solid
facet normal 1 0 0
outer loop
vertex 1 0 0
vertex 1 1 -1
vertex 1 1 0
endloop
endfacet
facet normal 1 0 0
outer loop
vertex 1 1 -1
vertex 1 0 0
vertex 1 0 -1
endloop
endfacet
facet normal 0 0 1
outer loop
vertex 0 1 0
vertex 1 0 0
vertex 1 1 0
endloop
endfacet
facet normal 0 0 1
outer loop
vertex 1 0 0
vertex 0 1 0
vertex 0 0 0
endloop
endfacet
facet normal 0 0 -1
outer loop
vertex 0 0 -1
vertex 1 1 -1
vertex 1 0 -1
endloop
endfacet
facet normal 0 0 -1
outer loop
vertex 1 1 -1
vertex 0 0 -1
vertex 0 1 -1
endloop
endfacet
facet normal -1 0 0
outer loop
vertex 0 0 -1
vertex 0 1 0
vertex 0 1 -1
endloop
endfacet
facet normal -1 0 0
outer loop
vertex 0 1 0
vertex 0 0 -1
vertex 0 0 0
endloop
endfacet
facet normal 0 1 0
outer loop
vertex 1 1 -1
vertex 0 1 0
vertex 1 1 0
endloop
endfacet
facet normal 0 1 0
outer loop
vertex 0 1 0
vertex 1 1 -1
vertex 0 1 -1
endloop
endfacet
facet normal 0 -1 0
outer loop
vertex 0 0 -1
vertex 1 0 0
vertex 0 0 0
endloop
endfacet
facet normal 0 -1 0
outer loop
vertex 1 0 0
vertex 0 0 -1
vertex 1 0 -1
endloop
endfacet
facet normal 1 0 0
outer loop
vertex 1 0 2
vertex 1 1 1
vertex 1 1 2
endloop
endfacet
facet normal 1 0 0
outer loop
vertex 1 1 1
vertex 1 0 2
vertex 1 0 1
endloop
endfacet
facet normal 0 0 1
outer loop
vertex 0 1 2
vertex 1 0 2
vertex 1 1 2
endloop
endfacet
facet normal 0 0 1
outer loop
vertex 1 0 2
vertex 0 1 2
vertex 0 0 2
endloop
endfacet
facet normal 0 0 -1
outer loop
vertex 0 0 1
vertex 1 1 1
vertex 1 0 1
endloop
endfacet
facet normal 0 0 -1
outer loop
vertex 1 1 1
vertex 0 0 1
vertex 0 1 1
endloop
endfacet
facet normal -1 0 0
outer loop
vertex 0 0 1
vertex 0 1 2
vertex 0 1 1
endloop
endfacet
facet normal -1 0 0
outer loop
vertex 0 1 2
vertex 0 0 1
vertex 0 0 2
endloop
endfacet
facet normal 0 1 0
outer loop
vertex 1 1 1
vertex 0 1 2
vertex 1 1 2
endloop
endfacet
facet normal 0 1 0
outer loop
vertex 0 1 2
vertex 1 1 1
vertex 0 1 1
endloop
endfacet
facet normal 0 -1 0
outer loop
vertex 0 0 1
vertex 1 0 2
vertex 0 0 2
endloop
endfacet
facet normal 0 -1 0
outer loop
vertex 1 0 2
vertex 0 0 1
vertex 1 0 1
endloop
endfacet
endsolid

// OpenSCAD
for (z = [-1, 1]) // two iterations, z = -1, z = 1
{
    translate([0, 0, z])
    cube(size = 1, center = false);
}
